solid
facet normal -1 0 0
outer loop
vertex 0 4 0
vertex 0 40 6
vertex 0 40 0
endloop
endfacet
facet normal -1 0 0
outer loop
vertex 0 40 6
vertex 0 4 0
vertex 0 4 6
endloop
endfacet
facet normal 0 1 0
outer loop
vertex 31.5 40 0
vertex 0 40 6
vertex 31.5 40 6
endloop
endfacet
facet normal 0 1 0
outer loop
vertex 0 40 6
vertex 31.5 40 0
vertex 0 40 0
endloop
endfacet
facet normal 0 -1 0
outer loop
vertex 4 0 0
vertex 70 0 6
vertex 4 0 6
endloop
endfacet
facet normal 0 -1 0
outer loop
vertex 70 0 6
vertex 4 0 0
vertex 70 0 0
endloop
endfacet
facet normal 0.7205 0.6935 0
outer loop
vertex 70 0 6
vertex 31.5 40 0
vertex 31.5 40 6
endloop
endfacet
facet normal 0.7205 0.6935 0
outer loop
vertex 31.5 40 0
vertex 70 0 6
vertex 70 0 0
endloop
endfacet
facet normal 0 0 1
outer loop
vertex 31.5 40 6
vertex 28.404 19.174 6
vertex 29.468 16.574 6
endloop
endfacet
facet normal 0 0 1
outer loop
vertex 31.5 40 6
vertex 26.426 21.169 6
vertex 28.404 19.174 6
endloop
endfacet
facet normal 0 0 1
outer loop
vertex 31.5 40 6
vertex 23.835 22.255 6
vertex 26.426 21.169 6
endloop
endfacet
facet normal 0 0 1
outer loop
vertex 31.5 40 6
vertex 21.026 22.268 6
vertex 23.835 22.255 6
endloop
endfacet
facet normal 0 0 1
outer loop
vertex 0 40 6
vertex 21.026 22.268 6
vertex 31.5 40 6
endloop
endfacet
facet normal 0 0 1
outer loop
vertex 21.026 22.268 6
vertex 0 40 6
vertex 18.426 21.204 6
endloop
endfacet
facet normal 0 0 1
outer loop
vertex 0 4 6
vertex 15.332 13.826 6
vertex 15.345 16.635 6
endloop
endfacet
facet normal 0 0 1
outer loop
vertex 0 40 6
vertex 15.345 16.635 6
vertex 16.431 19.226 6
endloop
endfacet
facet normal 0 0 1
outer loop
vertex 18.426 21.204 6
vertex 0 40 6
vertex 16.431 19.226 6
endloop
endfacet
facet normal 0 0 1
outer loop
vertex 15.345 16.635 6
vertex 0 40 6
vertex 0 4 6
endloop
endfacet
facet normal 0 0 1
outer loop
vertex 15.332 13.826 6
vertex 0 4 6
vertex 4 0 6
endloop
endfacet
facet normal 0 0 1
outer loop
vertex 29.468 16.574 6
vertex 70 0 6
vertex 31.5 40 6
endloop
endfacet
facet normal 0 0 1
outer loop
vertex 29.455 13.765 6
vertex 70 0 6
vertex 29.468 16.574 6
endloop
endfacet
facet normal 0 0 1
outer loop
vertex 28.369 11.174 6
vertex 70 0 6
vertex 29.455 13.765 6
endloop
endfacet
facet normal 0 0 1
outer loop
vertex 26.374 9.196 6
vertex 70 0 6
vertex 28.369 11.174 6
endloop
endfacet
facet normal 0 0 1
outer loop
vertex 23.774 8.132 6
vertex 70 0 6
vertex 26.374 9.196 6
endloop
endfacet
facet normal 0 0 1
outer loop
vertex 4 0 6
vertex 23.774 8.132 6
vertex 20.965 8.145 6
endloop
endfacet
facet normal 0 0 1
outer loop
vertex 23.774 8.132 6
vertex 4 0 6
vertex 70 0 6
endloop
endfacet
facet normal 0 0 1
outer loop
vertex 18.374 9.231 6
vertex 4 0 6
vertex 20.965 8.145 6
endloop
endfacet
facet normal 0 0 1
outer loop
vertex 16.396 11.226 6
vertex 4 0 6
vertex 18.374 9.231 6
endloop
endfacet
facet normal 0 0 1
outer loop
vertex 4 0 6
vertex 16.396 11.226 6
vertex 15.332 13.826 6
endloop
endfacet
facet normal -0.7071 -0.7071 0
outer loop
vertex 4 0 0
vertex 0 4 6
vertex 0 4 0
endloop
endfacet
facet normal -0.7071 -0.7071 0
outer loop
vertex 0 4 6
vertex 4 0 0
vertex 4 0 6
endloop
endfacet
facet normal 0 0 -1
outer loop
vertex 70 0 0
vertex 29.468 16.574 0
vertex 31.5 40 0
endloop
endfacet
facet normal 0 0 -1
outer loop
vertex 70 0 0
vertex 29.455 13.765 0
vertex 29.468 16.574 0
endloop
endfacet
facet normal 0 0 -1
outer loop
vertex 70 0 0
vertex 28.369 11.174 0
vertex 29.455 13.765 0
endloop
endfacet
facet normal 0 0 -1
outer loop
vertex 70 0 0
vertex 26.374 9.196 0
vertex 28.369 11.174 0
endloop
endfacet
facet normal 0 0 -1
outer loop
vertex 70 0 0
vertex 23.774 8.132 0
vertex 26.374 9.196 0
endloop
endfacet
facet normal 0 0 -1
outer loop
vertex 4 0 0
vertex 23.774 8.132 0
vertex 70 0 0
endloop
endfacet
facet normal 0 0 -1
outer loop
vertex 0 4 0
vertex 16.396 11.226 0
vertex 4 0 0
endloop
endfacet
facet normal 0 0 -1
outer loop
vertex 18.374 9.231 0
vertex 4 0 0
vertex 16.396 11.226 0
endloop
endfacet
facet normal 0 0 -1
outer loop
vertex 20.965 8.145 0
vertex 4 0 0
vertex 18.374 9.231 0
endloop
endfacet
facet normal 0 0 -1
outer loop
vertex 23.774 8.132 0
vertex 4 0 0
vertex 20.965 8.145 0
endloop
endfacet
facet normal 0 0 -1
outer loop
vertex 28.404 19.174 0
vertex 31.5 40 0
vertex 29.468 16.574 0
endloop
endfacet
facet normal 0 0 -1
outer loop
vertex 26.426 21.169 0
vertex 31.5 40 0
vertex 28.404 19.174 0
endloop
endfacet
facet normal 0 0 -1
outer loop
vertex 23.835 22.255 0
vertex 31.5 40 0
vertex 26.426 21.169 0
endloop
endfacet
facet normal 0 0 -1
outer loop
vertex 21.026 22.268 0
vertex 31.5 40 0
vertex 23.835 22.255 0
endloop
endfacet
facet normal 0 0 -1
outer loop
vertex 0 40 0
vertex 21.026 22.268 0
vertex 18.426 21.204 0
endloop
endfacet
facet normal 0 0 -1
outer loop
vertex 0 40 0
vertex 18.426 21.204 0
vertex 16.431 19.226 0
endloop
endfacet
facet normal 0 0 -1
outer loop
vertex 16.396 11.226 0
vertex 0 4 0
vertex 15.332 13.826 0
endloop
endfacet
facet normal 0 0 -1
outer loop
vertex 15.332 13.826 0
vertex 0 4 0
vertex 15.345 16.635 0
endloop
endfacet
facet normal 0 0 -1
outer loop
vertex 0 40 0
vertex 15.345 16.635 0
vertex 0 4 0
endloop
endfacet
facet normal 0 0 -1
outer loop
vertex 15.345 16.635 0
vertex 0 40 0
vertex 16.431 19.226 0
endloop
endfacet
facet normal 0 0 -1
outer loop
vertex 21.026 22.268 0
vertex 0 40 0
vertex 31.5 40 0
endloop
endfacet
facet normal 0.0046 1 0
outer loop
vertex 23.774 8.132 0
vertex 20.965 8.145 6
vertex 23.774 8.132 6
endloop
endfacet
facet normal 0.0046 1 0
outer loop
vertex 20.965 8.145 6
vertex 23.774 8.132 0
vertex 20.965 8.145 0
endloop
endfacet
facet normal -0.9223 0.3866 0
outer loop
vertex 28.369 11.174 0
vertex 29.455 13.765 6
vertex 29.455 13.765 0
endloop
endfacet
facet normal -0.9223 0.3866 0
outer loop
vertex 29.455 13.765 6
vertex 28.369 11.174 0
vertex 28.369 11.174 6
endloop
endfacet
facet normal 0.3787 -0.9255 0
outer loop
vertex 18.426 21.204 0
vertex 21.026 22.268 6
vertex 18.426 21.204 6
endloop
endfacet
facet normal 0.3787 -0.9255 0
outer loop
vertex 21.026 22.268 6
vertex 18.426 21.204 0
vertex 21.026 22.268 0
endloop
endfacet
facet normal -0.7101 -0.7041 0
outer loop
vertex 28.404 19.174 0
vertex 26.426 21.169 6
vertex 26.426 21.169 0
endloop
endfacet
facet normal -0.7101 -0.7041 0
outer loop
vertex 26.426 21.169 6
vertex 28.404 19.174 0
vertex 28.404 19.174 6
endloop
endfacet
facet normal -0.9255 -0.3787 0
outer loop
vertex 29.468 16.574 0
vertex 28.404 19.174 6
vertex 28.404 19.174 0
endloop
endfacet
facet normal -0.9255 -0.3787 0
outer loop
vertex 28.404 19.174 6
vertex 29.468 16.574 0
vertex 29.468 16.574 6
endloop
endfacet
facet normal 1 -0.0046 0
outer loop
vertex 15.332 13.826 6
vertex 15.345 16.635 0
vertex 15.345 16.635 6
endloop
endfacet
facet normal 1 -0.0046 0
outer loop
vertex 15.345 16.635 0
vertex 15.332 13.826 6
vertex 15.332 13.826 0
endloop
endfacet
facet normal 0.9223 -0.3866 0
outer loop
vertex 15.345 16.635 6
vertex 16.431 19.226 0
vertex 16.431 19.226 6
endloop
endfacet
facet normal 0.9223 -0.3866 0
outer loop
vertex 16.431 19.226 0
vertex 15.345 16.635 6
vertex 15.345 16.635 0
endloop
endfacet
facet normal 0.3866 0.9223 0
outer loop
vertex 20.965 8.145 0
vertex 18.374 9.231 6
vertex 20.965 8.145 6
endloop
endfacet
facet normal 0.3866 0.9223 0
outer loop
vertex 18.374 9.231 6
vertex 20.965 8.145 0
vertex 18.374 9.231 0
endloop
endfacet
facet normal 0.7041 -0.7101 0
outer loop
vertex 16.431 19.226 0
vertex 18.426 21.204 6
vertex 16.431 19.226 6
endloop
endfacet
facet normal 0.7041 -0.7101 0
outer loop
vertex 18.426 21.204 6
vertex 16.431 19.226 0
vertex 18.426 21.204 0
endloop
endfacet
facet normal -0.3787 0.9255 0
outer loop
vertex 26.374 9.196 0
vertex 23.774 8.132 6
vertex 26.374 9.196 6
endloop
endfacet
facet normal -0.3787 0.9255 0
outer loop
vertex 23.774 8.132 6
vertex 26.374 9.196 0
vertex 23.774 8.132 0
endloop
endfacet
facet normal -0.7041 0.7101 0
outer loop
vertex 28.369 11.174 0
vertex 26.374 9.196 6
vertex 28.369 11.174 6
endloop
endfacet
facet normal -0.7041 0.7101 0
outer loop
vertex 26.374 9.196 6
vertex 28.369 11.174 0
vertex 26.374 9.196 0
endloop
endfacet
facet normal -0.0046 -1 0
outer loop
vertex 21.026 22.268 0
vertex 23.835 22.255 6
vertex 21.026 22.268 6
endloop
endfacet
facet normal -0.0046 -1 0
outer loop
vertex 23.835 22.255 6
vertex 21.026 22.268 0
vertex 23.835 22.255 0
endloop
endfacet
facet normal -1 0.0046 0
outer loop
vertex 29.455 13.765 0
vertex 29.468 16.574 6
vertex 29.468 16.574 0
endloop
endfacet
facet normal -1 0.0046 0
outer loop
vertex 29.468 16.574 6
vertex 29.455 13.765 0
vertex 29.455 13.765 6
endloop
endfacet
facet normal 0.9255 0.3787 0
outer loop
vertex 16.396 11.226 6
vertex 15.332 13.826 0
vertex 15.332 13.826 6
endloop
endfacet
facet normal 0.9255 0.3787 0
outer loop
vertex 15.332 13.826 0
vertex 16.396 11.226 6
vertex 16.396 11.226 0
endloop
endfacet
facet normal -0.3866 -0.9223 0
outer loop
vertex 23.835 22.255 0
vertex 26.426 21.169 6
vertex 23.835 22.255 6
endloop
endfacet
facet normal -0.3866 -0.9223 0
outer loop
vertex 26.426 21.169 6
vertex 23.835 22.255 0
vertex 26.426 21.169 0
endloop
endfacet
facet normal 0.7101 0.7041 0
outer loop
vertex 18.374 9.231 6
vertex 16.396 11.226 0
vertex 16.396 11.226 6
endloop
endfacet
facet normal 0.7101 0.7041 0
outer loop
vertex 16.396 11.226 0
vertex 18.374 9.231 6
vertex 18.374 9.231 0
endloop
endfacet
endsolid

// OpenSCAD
$fn = 32;

// ----------------------------------------------------------------------
// Bracket plate: gusset 70 x 40
// ----------------------------------------------------------------------

// --- parameters (mm) ---
hole_r = 3.5;             // bolt hole radius
plate_t = 6;              // plate thickness, Z (extrusion height)
gus_a = 70;               // base length
gus_b = 40;               // height
top_x = 31.5;             // top edge X of the angled cut
light_r = 7.2;            // lightening hole radius

light_d = 2 * light_r;

profile = [[4, 0], [35, 0], [70, 0], [31.5, 40], [0, 40], [0, 4]];  // primary outline, 6 points, counter clockwise
void_1 = [[29.468, 16.574], [28.404, 19.174], [26.426, 21.169], [23.835, 22.255], [21.026, 22.268], [18.426, 21.204], [16.431, 19.226], [15.345, 16.635], [15.332, 13.826], [16.396, 11.226], [18.374, 9.231], [20.965, 8.145], [23.774, 8.132], [26.374, 9.196], [28.369, 11.174], [29.455, 13.765]];  // lightening hole, 16 points

// --- the one profile operation ---
difference() {
  linear_extrude(height = plate_t) polygon(points = profile);
  translate([0, 0, -1])
    linear_extrude(height = plate_t + 2) polygon(points = void_1);
}
